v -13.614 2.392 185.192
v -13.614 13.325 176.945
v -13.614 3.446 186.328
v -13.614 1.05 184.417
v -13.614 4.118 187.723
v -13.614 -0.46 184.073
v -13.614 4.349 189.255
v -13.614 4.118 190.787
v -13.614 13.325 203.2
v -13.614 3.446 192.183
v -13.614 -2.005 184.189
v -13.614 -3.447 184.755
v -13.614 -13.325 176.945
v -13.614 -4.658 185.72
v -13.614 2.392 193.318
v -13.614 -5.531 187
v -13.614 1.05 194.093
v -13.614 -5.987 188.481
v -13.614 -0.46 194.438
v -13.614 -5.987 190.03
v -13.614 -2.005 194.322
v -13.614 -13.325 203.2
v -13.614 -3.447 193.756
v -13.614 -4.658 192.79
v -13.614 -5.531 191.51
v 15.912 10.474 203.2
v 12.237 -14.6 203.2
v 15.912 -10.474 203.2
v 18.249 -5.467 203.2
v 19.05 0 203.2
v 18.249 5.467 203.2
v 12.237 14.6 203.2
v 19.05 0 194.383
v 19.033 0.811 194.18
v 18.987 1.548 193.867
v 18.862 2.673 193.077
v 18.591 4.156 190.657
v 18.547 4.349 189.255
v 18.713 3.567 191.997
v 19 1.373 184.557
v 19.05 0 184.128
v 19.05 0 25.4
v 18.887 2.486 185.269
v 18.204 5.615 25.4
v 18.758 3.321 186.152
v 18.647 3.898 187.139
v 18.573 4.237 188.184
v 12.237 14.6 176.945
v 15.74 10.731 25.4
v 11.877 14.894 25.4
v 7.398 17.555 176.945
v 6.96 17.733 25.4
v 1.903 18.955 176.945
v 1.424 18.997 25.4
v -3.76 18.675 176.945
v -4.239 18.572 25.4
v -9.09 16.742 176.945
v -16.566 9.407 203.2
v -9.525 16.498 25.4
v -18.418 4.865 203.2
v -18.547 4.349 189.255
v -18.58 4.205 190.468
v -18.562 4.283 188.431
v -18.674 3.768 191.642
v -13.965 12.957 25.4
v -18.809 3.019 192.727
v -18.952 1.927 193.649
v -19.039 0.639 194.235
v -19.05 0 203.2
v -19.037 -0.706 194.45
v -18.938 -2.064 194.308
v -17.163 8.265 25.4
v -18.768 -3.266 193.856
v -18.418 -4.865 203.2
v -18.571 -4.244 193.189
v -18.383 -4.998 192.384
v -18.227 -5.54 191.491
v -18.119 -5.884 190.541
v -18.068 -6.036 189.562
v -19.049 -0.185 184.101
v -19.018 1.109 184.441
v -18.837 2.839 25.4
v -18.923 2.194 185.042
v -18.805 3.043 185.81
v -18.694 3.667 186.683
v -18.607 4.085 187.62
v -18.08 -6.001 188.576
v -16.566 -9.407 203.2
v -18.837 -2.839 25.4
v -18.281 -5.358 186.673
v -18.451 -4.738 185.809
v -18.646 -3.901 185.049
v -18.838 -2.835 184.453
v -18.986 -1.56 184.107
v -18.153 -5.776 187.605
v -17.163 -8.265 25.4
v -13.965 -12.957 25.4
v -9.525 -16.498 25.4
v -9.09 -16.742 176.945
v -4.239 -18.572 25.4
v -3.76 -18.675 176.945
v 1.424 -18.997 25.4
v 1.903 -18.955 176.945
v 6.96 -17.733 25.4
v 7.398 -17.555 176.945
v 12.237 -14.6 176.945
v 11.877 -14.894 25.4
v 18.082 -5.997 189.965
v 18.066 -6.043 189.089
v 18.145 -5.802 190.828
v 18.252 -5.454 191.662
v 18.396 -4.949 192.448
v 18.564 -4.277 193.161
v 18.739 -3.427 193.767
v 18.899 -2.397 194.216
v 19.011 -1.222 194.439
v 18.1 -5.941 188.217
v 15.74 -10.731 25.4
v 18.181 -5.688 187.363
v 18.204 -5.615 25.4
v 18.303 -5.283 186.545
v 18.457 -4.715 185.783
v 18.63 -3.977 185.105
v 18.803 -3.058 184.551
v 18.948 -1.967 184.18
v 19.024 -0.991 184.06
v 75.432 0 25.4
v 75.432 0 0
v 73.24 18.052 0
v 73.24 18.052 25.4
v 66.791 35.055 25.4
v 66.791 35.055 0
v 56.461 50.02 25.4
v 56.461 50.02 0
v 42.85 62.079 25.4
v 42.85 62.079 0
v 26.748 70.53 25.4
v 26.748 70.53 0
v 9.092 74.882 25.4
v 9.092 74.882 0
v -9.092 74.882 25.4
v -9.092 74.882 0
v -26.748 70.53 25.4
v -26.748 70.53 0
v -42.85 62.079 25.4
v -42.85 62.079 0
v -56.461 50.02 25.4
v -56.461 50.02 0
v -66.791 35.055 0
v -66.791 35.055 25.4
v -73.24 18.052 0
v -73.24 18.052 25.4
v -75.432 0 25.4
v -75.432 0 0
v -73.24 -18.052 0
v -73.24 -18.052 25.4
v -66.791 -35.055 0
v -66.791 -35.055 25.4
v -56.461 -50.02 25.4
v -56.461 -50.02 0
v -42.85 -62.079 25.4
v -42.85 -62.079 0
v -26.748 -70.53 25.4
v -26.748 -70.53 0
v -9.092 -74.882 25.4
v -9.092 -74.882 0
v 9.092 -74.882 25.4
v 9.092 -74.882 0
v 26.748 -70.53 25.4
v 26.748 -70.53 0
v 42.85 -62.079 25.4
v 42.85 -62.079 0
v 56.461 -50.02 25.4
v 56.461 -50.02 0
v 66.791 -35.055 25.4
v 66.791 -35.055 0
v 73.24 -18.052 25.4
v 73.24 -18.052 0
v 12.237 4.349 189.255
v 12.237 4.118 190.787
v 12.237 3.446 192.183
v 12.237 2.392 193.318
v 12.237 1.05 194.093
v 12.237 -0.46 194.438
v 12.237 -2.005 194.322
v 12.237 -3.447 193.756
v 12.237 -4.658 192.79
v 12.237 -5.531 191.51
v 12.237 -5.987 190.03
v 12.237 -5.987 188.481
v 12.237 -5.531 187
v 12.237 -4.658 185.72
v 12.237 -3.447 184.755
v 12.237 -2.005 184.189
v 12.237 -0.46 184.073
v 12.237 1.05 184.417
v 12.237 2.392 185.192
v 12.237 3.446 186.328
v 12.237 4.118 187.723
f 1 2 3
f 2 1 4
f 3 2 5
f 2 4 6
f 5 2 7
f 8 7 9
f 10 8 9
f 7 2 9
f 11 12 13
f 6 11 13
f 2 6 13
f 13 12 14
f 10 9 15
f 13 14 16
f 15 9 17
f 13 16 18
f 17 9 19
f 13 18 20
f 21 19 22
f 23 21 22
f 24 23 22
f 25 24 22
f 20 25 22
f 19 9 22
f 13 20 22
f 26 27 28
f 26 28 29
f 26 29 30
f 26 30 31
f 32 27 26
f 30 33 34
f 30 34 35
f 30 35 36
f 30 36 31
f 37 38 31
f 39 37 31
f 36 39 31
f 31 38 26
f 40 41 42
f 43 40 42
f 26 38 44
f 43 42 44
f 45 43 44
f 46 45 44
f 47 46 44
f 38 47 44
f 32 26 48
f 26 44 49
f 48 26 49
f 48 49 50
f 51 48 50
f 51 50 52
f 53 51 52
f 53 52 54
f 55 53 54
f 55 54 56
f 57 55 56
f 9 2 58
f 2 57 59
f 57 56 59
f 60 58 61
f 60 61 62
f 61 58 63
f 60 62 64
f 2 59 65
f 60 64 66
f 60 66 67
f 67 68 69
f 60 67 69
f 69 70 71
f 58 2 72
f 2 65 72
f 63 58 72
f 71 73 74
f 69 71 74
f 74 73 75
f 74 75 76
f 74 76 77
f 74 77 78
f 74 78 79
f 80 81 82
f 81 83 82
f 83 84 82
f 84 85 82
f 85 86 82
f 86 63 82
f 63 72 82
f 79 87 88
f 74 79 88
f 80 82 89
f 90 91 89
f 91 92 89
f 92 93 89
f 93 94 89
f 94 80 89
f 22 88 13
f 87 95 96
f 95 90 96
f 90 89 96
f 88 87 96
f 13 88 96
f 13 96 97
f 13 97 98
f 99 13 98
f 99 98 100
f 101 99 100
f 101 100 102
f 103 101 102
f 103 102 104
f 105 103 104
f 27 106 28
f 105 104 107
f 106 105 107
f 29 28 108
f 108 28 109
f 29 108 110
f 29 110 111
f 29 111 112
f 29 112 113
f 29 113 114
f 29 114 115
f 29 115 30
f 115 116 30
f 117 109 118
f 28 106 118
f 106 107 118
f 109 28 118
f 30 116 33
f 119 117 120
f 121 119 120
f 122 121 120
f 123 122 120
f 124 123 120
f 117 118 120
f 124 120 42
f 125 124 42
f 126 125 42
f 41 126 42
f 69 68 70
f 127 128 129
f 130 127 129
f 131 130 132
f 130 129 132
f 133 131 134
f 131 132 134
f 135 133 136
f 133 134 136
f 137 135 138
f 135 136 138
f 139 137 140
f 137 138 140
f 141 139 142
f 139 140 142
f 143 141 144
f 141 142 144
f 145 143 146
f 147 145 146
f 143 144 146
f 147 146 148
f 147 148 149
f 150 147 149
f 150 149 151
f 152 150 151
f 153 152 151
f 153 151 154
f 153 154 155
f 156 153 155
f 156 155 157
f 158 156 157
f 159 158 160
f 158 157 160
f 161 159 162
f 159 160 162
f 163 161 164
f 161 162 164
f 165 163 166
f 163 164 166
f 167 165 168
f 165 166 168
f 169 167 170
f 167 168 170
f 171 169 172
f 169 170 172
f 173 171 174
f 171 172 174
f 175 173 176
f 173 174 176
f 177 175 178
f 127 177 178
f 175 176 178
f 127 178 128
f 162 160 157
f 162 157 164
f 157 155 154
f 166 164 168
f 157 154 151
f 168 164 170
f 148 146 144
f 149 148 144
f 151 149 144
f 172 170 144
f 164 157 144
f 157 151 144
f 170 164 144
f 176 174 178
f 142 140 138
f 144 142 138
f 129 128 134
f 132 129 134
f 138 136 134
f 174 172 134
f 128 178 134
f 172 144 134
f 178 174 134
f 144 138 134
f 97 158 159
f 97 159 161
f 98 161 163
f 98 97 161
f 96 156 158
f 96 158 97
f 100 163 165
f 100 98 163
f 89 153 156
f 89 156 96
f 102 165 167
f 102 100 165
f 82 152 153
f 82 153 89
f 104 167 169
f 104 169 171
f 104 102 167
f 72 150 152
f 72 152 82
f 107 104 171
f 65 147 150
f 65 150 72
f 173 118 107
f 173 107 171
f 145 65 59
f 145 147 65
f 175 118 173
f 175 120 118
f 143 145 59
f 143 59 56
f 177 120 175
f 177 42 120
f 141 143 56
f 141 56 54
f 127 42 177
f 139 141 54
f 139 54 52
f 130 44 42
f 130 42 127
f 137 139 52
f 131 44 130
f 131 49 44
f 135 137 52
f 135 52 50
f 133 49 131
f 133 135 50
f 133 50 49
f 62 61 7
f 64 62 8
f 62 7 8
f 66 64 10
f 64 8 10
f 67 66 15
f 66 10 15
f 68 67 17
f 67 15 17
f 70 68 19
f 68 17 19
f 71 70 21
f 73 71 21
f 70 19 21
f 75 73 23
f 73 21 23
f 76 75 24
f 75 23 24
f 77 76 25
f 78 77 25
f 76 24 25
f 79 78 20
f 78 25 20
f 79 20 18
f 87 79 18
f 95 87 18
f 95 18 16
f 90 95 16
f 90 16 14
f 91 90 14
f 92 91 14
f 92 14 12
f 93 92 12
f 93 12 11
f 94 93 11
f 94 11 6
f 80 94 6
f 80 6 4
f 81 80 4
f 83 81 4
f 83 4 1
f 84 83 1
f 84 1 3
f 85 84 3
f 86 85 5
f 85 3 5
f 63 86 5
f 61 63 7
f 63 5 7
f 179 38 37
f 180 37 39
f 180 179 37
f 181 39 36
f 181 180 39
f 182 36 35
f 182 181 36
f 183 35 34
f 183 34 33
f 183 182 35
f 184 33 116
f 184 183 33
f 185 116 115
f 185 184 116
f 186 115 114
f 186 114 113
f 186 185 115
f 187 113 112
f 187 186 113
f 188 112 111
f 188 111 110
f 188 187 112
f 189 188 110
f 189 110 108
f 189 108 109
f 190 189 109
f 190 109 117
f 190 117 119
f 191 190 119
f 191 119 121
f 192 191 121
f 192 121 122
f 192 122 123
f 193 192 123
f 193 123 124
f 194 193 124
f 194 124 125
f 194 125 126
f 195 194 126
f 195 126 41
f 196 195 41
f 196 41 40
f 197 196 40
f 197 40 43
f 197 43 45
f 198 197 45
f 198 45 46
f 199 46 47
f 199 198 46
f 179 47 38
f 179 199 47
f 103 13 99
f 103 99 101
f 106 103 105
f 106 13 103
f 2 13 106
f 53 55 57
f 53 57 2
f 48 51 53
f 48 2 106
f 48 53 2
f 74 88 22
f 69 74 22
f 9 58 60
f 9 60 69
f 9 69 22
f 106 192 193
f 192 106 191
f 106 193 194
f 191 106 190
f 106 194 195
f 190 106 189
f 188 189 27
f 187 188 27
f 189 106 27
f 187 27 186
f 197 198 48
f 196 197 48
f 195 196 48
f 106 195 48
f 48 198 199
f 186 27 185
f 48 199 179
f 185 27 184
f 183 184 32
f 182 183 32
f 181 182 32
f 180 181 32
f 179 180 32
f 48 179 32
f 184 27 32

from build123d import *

# Parameters (mm, degrees)
F0_R     = 75.4315959701
F1_DEPTH = 25.4
F10_R    = 19.05
F2_DEPTH = 203.2
F4_DEPTH = 26.25509
F5_R     = 5.3383463792
F6_DEPTH = 25.4
F7_R     = 5.1969918097
F8_DEPTH = 22.39609
F9_DEPTH = 72.38519


# Not quite as in the source:
# - a feature names something its author has since deleted; it is built from what else it names


with BuildPart() as f1:
    # F0 (on Top) → F1 (new body)
    with BuildSketch(Plane.XY):
        Circle(F0_R)
    extrude(amount=F1_DEPTH)

    # F10 (on Top) → F2 (join)
    with BuildSketch(Plane.XY):
        Circle(F10_R)
    extrude(amount=F2_DEPTH)

    # F3 (on face) → F4 (cut)
    with BuildSketch(Plane.XY.offset(203.2)):
        with BuildLine():
            ThreePointArc((12.2368524888, 14.6000664782), (-0.9386041951, 19.026863172), (-13.6144, 13.3248119176))
            Line((-13.6144, 13.3248119176), (-13.6144, -13.3248119176))
            ThreePointArc((-13.6144, -13.3248119176), (-0.9386041951, -19.026863172), (12.2368524888, -14.6000664782))
            Line((12.2368524888, -14.6000664782), (12.2368524888, 14.6000664782))
        make_face()
    extrude(amount=-F4_DEPTH, mode=Mode.SUBTRACT)

    # F5 (on face) → F6 (cut)
    with BuildSketch(Plane.YZ.offset(-13.6144)):
        with Locations((-189.9197250605, 0)):
            Circle(F5_R)
    extrude(amount=-F6_DEPTH, mode=Mode.SUBTRACT)

    # F7 (on face) → F8 (cut)
    with BuildSketch(Plane.YZ.offset(-13.6144)):
        with Locations((-0.8483366109, 189.2552375793)):
            Circle(F7_R)
    extrude(amount=-F8_DEPTH, mode=Mode.SUBTRACT)

    # F7 (on face) → F9 (cut)
    with BuildSketch(Plane.YZ.offset(-13.6144)):
        with Locations((-0.8483366109, 189.2552375793)):
            Circle(F7_R)
    extrude(amount=F9_DEPTH, mode=Mode.SUBTRACT)


solid = f1.part
